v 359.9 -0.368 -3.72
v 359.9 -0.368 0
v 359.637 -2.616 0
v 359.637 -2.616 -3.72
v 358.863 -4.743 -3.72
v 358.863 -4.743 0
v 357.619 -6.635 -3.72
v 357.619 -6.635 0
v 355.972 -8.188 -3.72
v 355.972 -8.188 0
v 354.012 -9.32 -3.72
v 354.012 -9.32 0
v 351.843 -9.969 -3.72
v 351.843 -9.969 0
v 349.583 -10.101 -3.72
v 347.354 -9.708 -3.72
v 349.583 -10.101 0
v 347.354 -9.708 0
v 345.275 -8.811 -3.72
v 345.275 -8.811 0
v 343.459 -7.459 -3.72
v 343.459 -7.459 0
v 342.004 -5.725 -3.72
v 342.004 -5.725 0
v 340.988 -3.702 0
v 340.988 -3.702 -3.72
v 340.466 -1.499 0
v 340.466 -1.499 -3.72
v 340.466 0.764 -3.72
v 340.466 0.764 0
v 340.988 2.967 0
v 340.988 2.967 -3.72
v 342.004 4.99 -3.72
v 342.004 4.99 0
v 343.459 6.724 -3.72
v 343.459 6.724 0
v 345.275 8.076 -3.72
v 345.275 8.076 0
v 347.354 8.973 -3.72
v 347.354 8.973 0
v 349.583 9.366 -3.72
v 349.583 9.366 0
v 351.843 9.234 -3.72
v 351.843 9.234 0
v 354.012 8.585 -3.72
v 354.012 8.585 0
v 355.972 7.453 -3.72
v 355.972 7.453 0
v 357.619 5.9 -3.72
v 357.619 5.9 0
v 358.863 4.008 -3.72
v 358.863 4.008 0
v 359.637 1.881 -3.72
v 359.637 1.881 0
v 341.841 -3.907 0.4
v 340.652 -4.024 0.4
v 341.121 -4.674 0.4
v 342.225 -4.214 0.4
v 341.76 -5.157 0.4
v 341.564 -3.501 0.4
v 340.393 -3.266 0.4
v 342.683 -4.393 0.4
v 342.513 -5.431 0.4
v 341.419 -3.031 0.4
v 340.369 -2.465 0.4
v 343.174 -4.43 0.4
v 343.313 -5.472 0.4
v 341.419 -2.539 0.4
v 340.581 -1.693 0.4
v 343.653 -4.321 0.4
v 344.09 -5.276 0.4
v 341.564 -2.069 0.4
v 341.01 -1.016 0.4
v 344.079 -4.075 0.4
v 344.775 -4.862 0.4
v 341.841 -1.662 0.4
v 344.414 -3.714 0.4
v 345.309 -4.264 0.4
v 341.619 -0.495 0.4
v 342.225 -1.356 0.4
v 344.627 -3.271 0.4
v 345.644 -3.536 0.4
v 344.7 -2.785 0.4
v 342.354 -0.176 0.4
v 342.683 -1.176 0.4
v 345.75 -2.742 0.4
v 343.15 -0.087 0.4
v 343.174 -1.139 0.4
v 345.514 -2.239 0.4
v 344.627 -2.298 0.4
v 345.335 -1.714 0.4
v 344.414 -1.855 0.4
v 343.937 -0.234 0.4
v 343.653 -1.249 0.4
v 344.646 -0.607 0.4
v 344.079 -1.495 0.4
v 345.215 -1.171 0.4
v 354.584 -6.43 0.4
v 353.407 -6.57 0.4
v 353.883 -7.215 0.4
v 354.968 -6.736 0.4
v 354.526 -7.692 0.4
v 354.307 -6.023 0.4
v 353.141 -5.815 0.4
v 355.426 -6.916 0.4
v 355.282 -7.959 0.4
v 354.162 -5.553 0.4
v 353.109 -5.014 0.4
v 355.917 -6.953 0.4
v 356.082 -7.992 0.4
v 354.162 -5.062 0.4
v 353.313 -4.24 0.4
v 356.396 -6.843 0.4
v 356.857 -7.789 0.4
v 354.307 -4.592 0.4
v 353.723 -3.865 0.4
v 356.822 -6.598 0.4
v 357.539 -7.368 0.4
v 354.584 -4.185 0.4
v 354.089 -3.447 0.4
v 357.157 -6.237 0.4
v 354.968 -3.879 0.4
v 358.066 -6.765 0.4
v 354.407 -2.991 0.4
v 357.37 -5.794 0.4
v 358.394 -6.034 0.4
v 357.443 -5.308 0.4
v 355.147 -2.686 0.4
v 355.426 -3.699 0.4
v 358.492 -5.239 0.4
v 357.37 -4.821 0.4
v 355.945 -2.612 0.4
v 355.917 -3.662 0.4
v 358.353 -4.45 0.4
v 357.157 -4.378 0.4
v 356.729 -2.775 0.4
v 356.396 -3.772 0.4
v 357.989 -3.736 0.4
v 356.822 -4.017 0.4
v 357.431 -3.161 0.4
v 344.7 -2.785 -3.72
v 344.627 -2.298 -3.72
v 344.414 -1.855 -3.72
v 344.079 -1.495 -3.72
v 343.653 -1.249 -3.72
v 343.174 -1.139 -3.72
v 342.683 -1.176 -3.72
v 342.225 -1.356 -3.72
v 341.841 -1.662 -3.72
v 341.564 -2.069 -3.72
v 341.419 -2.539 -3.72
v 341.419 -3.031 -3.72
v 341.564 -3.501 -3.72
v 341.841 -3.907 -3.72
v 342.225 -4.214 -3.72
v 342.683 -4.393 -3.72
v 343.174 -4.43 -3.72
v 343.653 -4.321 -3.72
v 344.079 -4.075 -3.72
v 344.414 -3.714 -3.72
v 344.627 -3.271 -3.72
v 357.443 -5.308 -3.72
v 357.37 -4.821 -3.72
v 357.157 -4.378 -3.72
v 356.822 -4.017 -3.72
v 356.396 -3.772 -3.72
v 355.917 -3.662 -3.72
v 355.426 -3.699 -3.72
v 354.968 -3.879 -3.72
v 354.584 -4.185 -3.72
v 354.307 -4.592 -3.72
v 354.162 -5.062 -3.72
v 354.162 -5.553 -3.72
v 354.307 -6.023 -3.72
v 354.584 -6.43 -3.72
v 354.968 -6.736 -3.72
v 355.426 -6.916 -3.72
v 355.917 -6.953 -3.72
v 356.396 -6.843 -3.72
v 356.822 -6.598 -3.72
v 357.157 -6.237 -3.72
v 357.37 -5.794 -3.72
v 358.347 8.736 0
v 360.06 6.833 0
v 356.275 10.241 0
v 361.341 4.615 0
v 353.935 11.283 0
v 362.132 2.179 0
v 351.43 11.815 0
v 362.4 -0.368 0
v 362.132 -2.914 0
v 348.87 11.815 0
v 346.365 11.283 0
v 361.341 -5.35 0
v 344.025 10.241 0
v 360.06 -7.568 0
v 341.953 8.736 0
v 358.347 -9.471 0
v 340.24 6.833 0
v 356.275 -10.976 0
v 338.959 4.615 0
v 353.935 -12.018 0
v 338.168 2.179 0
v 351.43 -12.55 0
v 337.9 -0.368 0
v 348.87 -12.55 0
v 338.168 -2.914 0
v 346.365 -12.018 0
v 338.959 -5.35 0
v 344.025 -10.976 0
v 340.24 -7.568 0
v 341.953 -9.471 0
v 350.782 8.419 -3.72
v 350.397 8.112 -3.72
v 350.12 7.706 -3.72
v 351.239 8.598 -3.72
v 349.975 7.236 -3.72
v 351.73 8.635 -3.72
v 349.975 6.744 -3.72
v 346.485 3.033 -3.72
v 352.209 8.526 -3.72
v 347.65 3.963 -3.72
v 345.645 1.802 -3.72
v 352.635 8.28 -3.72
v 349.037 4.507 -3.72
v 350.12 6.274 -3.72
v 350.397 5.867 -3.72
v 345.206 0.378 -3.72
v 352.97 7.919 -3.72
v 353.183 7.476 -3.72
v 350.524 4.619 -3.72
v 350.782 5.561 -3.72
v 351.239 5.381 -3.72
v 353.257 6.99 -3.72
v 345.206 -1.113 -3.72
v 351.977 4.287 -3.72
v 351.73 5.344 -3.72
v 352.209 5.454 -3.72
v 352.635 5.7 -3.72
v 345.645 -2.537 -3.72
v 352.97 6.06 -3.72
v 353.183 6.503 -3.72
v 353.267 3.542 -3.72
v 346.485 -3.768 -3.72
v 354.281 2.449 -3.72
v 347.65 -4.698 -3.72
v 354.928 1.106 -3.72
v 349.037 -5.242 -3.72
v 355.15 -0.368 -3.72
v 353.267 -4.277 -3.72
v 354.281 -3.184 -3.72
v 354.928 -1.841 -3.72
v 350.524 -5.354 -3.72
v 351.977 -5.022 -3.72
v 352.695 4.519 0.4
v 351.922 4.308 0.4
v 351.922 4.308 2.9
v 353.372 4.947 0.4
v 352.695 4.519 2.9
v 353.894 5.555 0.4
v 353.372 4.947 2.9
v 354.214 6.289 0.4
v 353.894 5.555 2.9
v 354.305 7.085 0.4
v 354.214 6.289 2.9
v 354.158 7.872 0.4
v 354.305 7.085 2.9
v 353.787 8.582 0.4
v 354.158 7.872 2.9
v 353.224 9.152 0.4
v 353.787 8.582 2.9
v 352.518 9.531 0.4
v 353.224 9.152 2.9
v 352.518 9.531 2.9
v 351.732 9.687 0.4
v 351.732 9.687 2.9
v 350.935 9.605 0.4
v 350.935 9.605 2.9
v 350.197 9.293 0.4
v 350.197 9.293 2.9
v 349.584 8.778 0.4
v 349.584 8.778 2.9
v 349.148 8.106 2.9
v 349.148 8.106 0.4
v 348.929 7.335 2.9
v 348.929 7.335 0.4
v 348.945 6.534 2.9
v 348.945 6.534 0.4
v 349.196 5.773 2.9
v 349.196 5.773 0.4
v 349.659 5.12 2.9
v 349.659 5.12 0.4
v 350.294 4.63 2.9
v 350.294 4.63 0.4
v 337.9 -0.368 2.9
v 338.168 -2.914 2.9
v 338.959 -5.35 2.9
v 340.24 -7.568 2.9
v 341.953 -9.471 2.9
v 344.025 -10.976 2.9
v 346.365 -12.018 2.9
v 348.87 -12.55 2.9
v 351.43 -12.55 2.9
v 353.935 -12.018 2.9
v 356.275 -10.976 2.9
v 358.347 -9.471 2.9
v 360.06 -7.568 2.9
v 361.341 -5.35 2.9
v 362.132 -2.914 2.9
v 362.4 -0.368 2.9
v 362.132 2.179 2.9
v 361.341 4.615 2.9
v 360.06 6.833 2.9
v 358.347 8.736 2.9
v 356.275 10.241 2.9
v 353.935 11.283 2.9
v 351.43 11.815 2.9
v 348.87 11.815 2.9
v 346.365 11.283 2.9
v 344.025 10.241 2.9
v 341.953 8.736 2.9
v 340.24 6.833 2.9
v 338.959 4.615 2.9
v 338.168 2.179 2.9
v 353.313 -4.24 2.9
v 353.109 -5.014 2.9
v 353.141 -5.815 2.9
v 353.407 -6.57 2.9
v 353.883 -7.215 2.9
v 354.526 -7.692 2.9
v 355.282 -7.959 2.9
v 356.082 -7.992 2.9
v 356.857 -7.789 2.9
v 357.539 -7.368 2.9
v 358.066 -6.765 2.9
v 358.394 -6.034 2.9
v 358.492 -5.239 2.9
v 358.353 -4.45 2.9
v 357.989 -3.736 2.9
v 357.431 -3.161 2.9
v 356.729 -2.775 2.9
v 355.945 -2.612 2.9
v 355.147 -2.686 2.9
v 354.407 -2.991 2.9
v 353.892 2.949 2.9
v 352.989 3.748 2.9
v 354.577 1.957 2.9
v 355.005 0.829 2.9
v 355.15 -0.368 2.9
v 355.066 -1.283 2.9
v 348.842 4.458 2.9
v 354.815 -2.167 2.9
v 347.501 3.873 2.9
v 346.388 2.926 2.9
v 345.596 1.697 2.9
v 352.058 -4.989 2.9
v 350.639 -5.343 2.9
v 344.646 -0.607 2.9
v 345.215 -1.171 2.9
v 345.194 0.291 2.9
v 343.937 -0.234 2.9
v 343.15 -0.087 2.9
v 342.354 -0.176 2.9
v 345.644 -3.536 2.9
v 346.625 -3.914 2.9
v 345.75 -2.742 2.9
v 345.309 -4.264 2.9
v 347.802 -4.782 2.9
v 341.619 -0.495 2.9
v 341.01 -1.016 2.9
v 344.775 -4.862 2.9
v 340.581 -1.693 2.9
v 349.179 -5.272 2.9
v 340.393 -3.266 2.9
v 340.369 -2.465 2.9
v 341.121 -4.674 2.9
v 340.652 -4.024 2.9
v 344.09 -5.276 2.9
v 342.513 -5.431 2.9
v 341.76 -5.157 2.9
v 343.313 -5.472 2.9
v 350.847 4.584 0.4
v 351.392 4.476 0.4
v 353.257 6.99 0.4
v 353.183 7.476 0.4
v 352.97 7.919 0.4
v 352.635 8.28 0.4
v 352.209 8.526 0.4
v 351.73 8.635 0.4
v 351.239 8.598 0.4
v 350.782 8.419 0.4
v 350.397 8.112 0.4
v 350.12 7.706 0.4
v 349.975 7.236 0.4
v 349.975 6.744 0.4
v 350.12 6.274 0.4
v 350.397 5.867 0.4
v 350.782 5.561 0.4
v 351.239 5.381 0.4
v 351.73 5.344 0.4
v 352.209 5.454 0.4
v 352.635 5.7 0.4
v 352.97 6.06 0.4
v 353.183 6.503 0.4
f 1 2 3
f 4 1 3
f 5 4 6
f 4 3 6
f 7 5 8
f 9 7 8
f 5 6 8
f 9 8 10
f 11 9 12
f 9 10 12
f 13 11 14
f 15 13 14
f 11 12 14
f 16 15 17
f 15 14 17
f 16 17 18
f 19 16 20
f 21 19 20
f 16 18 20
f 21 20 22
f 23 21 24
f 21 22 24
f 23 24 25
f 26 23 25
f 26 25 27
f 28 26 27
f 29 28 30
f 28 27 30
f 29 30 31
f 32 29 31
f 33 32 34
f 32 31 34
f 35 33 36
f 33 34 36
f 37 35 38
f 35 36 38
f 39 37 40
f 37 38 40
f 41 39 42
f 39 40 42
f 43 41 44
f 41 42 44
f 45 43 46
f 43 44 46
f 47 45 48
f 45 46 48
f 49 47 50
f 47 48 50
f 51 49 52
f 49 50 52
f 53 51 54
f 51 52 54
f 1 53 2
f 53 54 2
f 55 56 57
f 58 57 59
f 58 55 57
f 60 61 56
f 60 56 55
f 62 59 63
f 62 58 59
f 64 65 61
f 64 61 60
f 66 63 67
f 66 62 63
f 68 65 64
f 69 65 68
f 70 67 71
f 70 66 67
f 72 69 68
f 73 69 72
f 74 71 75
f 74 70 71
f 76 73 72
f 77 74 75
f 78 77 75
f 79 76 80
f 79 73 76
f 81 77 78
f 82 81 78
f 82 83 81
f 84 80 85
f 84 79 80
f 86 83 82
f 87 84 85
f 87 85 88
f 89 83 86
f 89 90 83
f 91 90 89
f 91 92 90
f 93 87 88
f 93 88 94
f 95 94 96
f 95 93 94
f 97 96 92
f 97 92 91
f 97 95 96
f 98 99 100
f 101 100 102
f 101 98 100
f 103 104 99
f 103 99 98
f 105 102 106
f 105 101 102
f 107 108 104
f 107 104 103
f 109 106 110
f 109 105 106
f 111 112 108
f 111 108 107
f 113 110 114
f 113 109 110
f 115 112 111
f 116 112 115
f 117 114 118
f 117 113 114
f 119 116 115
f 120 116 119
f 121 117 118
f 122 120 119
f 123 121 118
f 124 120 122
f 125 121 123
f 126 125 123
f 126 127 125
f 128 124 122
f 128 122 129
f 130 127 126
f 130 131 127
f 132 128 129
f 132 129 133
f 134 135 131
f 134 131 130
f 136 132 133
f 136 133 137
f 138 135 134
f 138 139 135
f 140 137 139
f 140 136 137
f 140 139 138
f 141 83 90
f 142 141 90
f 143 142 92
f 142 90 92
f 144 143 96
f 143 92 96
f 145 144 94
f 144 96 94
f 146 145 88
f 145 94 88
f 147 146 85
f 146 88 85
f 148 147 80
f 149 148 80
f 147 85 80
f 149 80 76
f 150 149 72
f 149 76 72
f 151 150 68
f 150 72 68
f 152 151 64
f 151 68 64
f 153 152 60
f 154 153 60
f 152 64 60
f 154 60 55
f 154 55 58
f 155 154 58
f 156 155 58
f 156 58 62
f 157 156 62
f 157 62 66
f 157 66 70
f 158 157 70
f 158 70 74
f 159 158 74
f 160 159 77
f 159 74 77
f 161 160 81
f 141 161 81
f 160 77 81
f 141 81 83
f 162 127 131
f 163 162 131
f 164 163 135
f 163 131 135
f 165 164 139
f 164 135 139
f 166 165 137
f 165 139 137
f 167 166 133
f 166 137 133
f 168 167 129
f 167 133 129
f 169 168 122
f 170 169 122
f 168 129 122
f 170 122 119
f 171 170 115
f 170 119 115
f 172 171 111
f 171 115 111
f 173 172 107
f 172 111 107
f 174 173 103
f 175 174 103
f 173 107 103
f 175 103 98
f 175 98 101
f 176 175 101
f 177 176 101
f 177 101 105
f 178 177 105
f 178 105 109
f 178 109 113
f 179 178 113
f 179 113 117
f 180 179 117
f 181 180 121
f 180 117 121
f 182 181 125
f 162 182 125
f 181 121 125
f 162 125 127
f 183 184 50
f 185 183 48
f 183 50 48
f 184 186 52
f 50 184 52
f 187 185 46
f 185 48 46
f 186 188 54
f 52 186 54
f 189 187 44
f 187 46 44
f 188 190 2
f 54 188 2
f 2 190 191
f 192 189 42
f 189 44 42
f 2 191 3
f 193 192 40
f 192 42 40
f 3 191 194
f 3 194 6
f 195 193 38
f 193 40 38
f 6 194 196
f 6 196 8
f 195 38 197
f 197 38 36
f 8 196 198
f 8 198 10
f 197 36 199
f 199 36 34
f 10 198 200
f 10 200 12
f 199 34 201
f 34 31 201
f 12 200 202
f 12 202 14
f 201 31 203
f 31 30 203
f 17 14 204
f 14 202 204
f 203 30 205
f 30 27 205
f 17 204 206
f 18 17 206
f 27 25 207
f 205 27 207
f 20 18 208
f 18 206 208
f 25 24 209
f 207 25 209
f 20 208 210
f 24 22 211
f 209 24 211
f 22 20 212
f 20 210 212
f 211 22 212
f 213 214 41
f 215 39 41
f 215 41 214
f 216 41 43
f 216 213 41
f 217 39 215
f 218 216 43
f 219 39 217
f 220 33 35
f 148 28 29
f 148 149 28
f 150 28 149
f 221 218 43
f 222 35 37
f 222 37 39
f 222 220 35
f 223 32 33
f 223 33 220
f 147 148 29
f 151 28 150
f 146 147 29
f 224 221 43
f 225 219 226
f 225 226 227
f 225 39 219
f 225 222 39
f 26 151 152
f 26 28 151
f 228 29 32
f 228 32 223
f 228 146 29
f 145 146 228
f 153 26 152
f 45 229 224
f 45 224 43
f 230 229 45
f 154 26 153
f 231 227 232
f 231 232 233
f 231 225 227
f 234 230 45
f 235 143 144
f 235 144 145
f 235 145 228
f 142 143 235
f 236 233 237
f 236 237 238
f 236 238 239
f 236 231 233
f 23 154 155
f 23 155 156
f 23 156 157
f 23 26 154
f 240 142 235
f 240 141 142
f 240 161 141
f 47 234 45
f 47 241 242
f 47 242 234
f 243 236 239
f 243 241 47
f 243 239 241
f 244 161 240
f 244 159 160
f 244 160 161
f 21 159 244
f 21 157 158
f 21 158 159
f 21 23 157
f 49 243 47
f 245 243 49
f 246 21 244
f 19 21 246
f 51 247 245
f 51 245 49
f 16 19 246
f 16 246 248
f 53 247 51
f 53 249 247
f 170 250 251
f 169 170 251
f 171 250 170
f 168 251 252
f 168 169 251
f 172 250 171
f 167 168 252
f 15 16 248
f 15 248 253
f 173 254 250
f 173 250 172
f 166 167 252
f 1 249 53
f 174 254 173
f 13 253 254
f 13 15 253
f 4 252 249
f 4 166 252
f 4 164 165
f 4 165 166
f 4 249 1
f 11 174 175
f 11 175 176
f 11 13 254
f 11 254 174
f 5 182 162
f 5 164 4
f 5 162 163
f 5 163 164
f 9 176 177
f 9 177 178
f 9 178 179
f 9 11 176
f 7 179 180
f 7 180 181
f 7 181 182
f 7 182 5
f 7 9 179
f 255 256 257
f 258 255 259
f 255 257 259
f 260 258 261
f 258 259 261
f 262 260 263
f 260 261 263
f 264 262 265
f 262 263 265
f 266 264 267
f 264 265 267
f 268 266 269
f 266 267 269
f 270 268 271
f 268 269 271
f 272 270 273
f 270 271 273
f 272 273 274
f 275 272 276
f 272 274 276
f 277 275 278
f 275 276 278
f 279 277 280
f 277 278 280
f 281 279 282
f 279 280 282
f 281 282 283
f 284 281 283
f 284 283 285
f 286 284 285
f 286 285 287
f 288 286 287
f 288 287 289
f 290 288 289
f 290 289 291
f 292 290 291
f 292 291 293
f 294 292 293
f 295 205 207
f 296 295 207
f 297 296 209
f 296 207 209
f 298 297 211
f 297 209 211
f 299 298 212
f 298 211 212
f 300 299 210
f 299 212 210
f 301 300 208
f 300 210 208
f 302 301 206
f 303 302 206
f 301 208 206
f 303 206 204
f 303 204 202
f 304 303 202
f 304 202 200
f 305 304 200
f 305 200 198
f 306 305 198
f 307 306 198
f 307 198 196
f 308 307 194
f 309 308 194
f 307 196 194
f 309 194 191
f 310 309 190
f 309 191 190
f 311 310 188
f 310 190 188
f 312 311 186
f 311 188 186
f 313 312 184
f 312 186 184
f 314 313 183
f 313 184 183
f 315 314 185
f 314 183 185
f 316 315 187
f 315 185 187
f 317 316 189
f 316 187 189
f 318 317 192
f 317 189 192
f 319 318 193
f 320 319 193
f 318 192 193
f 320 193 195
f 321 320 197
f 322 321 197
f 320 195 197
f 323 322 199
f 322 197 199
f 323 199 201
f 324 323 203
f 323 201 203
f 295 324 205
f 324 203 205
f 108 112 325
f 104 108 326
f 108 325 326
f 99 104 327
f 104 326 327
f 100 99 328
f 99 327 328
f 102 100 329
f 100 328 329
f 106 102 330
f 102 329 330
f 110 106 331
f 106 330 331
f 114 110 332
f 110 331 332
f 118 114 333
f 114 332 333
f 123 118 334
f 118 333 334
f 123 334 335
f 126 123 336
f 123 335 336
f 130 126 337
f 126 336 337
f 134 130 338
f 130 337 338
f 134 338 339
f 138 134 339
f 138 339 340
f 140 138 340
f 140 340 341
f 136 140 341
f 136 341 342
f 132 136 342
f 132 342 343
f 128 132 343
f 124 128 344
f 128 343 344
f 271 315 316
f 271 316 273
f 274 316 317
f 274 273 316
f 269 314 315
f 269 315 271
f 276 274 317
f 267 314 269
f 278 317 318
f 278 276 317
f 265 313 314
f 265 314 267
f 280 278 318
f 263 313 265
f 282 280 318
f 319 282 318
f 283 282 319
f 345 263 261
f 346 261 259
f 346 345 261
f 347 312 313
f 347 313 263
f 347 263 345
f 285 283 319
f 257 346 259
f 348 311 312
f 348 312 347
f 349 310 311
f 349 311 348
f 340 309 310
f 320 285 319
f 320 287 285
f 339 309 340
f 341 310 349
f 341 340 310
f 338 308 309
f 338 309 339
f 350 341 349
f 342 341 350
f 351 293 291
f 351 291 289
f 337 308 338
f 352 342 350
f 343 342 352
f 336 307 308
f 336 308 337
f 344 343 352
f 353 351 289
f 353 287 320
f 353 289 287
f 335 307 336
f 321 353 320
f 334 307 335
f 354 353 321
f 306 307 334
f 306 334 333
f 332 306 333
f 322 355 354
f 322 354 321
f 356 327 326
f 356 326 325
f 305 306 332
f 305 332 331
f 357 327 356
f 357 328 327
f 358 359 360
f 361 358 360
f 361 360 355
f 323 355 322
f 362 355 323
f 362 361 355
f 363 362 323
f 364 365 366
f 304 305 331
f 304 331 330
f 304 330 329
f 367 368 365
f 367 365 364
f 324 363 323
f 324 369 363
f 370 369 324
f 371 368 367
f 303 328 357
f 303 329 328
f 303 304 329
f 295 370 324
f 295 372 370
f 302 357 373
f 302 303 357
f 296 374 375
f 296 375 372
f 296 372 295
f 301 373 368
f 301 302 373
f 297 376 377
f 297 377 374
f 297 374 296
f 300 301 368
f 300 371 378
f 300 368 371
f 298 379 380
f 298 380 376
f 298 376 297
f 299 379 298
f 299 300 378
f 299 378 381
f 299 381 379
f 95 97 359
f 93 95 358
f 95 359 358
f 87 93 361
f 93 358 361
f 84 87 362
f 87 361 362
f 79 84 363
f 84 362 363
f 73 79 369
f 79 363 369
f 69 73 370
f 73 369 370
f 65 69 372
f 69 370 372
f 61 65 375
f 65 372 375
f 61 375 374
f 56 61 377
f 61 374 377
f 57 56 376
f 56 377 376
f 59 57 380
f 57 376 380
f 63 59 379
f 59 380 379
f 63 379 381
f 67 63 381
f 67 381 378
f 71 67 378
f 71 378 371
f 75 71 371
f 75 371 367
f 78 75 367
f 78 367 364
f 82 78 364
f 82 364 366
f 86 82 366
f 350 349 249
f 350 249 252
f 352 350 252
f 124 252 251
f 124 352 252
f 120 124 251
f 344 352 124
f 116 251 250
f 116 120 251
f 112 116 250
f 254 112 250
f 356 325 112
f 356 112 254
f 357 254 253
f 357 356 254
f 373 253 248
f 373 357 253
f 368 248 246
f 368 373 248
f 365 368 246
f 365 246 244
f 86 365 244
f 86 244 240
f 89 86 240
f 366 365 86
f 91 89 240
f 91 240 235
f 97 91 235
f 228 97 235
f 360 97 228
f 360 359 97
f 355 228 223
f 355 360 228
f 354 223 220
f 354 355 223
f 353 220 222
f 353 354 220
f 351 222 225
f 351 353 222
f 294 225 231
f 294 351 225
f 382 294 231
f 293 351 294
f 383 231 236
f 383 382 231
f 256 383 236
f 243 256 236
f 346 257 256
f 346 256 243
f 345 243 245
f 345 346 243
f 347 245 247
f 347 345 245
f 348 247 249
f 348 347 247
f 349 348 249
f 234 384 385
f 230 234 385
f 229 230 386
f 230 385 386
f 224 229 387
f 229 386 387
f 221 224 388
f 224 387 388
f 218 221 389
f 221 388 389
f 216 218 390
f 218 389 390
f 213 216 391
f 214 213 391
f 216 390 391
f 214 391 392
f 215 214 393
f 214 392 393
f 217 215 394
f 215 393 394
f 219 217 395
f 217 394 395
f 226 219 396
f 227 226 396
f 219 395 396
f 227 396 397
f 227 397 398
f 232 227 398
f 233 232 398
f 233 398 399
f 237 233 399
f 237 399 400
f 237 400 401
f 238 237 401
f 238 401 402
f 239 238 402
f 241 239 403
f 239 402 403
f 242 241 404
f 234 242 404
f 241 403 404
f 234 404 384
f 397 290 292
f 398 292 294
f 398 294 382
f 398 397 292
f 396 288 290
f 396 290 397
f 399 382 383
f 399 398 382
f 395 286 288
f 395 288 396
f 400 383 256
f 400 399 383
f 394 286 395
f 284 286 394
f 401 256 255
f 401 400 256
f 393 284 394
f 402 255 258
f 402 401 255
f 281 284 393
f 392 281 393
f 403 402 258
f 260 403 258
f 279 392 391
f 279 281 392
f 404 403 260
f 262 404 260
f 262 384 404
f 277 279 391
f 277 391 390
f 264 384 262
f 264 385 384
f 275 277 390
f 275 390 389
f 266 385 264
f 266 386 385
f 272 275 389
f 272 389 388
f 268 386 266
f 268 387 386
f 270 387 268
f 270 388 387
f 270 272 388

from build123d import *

# Parameters (mm, degrees)
SKETCH1_R           = 12.25
BOSS_EXTRUDE1_DEPTH = 2.9
CUT_EXTRUDE1_REACH  = 364.631
SKETCH2_R           = 5
CUT_EXTRUDE2_REACH  = 364.631
SKETCH5_R           = 1.65
SKETCH6_R           = 9.75
SKETCH6_R_2         = 5
BOSS_EXTRUDE2_DEPTH = 3.72
SKETCH7_R           = 1.65
CUT_EXTRUDE3_DEPTH  = 3.72
SKETCH8_R           = 2.7
CUT_EXTRUDE4_DEPTH  = 2.5


with BuildPart() as part:
    # Sketch1 → Boss-Extrude1 (new body)
    with BuildSketch(Plane.XY):
        with Locations(Location((350.15, -0.367507575, 0), (0, 0, 180))):
            Circle(SKETCH1_R)
    extrude(amount=BOSS_EXTRUDE1_DEPTH)

    # Sketch2 → Cut-Extrude1 (cut, up to next)
    with BuildSketch(Plane.XY.offset(2.9), mode=Mode.PRIVATE) as cut_extrude1_sk1:
        with Locations((350.15, -0.367507575)):
            Circle(SKETCH2_R)
    cut_extrude1_tool1 = extrude(cut_extrude1_sk1.sketch, amount=-CUT_EXTRUDE1_REACH, mode=Mode.PRIVATE) & part.part
    add(cut_extrude1_tool1.solids().sort_by_distance((350.15, -0.367508, 2.9))[0], mode=Mode.SUBTRACT)

    # Sketch5 → Cut-Extrude2 (cut, up to next)
    with BuildSketch(Plane.XY.offset(2.9), mode=Mode.PRIVATE) as cut_extrude2_sk1:
        with Locations((343.05020627, -2.784722708)):
            Circle(SKETCH5_R)
    cut_extrude2_tool1 = extrude(cut_extrude2_sk1.sketch, amount=-CUT_EXTRUDE2_REACH, mode=Mode.PRIVATE) & part.part
    # Sketch5 → Cut-Extrude2 (cut, up to next)
    with BuildSketch(Plane.XY.offset(2.9), mode=Mode.PRIVATE) as cut_extrude2_sk2:
        with Locations((355.793266576, -5.30750174)):
            Circle(SKETCH5_R)
    cut_extrude2_tool2 = extrude(cut_extrude2_sk2.sketch, amount=-CUT_EXTRUDE2_REACH, mode=Mode.PRIVATE) & part.part
    # Sketch5 → Cut-Extrude2 (cut, up to next)
    with BuildSketch(Plane.XY.offset(2.9), mode=Mode.PRIVATE) as cut_extrude2_sk3:
        with Locations((351.606527153, 6.989701723)):
            Circle(SKETCH5_R)
    cut_extrude2_tool3 = extrude(cut_extrude2_sk3.sketch, amount=-CUT_EXTRUDE2_REACH, mode=Mode.PRIVATE) & part.part
    add(cut_extrude2_tool1.solids().sort_by_distance((343.050206, -2.784723, 2.9))[0], mode=Mode.SUBTRACT)
    add(cut_extrude2_tool2.solids().sort_by_distance((355.793267, -5.307502, 2.9))[0], mode=Mode.SUBTRACT)
    add(cut_extrude2_tool3.solids().sort_by_distance((351.606527, 6.989702, 2.9))[0], mode=Mode.SUBTRACT)

    # Sketch6 → Boss-Extrude2 (add)
    with BuildSketch(Plane(origin=(0, 0, 0), x_dir=(-1, 0, 0), z_dir=(0, 0, -1))):
        with Locations(Location((-350.15, -0.367507575, 0), (0, 0, 180))):
            Circle(SKETCH6_R)
        with Locations(Location((-350.15, -0.367507575, 0), (0, 0, 180))):
            Circle(SKETCH6_R_2, mode=Mode.SUBTRACT)
    extrude(amount=BOSS_EXTRUDE2_DEPTH)

    # Sketch7 → Cut-Extrude3 (cut)
    with BuildSketch(Plane.XY):
        with Locations((351.606527153, 6.989701723)):
            Circle(SKETCH7_R)
        with Locations((343.05020627, -2.784722708)):
            Circle(SKETCH7_R)
        with Locations((355.793266576, -5.30750174)):
            Circle(SKETCH7_R)
    extrude(amount=-CUT_EXTRUDE3_DEPTH, mode=Mode.SUBTRACT)

    # Sketch8 → Cut-Extrude4 (cut)
    with BuildSketch(Plane.XY.offset(2.9)):
        with Locations((351.606527153, 6.989701723)):
            Circle(SKETCH8_R)
        with Locations((355.793266576, -5.30750174)):
            Circle(SKETCH8_R)
        with Locations((343.05020627, -2.784722708)):
            Circle(SKETCH8_R)
    extrude(amount=-CUT_EXTRUDE4_DEPTH, mode=Mode.SUBTRACT)


solid = part.part
